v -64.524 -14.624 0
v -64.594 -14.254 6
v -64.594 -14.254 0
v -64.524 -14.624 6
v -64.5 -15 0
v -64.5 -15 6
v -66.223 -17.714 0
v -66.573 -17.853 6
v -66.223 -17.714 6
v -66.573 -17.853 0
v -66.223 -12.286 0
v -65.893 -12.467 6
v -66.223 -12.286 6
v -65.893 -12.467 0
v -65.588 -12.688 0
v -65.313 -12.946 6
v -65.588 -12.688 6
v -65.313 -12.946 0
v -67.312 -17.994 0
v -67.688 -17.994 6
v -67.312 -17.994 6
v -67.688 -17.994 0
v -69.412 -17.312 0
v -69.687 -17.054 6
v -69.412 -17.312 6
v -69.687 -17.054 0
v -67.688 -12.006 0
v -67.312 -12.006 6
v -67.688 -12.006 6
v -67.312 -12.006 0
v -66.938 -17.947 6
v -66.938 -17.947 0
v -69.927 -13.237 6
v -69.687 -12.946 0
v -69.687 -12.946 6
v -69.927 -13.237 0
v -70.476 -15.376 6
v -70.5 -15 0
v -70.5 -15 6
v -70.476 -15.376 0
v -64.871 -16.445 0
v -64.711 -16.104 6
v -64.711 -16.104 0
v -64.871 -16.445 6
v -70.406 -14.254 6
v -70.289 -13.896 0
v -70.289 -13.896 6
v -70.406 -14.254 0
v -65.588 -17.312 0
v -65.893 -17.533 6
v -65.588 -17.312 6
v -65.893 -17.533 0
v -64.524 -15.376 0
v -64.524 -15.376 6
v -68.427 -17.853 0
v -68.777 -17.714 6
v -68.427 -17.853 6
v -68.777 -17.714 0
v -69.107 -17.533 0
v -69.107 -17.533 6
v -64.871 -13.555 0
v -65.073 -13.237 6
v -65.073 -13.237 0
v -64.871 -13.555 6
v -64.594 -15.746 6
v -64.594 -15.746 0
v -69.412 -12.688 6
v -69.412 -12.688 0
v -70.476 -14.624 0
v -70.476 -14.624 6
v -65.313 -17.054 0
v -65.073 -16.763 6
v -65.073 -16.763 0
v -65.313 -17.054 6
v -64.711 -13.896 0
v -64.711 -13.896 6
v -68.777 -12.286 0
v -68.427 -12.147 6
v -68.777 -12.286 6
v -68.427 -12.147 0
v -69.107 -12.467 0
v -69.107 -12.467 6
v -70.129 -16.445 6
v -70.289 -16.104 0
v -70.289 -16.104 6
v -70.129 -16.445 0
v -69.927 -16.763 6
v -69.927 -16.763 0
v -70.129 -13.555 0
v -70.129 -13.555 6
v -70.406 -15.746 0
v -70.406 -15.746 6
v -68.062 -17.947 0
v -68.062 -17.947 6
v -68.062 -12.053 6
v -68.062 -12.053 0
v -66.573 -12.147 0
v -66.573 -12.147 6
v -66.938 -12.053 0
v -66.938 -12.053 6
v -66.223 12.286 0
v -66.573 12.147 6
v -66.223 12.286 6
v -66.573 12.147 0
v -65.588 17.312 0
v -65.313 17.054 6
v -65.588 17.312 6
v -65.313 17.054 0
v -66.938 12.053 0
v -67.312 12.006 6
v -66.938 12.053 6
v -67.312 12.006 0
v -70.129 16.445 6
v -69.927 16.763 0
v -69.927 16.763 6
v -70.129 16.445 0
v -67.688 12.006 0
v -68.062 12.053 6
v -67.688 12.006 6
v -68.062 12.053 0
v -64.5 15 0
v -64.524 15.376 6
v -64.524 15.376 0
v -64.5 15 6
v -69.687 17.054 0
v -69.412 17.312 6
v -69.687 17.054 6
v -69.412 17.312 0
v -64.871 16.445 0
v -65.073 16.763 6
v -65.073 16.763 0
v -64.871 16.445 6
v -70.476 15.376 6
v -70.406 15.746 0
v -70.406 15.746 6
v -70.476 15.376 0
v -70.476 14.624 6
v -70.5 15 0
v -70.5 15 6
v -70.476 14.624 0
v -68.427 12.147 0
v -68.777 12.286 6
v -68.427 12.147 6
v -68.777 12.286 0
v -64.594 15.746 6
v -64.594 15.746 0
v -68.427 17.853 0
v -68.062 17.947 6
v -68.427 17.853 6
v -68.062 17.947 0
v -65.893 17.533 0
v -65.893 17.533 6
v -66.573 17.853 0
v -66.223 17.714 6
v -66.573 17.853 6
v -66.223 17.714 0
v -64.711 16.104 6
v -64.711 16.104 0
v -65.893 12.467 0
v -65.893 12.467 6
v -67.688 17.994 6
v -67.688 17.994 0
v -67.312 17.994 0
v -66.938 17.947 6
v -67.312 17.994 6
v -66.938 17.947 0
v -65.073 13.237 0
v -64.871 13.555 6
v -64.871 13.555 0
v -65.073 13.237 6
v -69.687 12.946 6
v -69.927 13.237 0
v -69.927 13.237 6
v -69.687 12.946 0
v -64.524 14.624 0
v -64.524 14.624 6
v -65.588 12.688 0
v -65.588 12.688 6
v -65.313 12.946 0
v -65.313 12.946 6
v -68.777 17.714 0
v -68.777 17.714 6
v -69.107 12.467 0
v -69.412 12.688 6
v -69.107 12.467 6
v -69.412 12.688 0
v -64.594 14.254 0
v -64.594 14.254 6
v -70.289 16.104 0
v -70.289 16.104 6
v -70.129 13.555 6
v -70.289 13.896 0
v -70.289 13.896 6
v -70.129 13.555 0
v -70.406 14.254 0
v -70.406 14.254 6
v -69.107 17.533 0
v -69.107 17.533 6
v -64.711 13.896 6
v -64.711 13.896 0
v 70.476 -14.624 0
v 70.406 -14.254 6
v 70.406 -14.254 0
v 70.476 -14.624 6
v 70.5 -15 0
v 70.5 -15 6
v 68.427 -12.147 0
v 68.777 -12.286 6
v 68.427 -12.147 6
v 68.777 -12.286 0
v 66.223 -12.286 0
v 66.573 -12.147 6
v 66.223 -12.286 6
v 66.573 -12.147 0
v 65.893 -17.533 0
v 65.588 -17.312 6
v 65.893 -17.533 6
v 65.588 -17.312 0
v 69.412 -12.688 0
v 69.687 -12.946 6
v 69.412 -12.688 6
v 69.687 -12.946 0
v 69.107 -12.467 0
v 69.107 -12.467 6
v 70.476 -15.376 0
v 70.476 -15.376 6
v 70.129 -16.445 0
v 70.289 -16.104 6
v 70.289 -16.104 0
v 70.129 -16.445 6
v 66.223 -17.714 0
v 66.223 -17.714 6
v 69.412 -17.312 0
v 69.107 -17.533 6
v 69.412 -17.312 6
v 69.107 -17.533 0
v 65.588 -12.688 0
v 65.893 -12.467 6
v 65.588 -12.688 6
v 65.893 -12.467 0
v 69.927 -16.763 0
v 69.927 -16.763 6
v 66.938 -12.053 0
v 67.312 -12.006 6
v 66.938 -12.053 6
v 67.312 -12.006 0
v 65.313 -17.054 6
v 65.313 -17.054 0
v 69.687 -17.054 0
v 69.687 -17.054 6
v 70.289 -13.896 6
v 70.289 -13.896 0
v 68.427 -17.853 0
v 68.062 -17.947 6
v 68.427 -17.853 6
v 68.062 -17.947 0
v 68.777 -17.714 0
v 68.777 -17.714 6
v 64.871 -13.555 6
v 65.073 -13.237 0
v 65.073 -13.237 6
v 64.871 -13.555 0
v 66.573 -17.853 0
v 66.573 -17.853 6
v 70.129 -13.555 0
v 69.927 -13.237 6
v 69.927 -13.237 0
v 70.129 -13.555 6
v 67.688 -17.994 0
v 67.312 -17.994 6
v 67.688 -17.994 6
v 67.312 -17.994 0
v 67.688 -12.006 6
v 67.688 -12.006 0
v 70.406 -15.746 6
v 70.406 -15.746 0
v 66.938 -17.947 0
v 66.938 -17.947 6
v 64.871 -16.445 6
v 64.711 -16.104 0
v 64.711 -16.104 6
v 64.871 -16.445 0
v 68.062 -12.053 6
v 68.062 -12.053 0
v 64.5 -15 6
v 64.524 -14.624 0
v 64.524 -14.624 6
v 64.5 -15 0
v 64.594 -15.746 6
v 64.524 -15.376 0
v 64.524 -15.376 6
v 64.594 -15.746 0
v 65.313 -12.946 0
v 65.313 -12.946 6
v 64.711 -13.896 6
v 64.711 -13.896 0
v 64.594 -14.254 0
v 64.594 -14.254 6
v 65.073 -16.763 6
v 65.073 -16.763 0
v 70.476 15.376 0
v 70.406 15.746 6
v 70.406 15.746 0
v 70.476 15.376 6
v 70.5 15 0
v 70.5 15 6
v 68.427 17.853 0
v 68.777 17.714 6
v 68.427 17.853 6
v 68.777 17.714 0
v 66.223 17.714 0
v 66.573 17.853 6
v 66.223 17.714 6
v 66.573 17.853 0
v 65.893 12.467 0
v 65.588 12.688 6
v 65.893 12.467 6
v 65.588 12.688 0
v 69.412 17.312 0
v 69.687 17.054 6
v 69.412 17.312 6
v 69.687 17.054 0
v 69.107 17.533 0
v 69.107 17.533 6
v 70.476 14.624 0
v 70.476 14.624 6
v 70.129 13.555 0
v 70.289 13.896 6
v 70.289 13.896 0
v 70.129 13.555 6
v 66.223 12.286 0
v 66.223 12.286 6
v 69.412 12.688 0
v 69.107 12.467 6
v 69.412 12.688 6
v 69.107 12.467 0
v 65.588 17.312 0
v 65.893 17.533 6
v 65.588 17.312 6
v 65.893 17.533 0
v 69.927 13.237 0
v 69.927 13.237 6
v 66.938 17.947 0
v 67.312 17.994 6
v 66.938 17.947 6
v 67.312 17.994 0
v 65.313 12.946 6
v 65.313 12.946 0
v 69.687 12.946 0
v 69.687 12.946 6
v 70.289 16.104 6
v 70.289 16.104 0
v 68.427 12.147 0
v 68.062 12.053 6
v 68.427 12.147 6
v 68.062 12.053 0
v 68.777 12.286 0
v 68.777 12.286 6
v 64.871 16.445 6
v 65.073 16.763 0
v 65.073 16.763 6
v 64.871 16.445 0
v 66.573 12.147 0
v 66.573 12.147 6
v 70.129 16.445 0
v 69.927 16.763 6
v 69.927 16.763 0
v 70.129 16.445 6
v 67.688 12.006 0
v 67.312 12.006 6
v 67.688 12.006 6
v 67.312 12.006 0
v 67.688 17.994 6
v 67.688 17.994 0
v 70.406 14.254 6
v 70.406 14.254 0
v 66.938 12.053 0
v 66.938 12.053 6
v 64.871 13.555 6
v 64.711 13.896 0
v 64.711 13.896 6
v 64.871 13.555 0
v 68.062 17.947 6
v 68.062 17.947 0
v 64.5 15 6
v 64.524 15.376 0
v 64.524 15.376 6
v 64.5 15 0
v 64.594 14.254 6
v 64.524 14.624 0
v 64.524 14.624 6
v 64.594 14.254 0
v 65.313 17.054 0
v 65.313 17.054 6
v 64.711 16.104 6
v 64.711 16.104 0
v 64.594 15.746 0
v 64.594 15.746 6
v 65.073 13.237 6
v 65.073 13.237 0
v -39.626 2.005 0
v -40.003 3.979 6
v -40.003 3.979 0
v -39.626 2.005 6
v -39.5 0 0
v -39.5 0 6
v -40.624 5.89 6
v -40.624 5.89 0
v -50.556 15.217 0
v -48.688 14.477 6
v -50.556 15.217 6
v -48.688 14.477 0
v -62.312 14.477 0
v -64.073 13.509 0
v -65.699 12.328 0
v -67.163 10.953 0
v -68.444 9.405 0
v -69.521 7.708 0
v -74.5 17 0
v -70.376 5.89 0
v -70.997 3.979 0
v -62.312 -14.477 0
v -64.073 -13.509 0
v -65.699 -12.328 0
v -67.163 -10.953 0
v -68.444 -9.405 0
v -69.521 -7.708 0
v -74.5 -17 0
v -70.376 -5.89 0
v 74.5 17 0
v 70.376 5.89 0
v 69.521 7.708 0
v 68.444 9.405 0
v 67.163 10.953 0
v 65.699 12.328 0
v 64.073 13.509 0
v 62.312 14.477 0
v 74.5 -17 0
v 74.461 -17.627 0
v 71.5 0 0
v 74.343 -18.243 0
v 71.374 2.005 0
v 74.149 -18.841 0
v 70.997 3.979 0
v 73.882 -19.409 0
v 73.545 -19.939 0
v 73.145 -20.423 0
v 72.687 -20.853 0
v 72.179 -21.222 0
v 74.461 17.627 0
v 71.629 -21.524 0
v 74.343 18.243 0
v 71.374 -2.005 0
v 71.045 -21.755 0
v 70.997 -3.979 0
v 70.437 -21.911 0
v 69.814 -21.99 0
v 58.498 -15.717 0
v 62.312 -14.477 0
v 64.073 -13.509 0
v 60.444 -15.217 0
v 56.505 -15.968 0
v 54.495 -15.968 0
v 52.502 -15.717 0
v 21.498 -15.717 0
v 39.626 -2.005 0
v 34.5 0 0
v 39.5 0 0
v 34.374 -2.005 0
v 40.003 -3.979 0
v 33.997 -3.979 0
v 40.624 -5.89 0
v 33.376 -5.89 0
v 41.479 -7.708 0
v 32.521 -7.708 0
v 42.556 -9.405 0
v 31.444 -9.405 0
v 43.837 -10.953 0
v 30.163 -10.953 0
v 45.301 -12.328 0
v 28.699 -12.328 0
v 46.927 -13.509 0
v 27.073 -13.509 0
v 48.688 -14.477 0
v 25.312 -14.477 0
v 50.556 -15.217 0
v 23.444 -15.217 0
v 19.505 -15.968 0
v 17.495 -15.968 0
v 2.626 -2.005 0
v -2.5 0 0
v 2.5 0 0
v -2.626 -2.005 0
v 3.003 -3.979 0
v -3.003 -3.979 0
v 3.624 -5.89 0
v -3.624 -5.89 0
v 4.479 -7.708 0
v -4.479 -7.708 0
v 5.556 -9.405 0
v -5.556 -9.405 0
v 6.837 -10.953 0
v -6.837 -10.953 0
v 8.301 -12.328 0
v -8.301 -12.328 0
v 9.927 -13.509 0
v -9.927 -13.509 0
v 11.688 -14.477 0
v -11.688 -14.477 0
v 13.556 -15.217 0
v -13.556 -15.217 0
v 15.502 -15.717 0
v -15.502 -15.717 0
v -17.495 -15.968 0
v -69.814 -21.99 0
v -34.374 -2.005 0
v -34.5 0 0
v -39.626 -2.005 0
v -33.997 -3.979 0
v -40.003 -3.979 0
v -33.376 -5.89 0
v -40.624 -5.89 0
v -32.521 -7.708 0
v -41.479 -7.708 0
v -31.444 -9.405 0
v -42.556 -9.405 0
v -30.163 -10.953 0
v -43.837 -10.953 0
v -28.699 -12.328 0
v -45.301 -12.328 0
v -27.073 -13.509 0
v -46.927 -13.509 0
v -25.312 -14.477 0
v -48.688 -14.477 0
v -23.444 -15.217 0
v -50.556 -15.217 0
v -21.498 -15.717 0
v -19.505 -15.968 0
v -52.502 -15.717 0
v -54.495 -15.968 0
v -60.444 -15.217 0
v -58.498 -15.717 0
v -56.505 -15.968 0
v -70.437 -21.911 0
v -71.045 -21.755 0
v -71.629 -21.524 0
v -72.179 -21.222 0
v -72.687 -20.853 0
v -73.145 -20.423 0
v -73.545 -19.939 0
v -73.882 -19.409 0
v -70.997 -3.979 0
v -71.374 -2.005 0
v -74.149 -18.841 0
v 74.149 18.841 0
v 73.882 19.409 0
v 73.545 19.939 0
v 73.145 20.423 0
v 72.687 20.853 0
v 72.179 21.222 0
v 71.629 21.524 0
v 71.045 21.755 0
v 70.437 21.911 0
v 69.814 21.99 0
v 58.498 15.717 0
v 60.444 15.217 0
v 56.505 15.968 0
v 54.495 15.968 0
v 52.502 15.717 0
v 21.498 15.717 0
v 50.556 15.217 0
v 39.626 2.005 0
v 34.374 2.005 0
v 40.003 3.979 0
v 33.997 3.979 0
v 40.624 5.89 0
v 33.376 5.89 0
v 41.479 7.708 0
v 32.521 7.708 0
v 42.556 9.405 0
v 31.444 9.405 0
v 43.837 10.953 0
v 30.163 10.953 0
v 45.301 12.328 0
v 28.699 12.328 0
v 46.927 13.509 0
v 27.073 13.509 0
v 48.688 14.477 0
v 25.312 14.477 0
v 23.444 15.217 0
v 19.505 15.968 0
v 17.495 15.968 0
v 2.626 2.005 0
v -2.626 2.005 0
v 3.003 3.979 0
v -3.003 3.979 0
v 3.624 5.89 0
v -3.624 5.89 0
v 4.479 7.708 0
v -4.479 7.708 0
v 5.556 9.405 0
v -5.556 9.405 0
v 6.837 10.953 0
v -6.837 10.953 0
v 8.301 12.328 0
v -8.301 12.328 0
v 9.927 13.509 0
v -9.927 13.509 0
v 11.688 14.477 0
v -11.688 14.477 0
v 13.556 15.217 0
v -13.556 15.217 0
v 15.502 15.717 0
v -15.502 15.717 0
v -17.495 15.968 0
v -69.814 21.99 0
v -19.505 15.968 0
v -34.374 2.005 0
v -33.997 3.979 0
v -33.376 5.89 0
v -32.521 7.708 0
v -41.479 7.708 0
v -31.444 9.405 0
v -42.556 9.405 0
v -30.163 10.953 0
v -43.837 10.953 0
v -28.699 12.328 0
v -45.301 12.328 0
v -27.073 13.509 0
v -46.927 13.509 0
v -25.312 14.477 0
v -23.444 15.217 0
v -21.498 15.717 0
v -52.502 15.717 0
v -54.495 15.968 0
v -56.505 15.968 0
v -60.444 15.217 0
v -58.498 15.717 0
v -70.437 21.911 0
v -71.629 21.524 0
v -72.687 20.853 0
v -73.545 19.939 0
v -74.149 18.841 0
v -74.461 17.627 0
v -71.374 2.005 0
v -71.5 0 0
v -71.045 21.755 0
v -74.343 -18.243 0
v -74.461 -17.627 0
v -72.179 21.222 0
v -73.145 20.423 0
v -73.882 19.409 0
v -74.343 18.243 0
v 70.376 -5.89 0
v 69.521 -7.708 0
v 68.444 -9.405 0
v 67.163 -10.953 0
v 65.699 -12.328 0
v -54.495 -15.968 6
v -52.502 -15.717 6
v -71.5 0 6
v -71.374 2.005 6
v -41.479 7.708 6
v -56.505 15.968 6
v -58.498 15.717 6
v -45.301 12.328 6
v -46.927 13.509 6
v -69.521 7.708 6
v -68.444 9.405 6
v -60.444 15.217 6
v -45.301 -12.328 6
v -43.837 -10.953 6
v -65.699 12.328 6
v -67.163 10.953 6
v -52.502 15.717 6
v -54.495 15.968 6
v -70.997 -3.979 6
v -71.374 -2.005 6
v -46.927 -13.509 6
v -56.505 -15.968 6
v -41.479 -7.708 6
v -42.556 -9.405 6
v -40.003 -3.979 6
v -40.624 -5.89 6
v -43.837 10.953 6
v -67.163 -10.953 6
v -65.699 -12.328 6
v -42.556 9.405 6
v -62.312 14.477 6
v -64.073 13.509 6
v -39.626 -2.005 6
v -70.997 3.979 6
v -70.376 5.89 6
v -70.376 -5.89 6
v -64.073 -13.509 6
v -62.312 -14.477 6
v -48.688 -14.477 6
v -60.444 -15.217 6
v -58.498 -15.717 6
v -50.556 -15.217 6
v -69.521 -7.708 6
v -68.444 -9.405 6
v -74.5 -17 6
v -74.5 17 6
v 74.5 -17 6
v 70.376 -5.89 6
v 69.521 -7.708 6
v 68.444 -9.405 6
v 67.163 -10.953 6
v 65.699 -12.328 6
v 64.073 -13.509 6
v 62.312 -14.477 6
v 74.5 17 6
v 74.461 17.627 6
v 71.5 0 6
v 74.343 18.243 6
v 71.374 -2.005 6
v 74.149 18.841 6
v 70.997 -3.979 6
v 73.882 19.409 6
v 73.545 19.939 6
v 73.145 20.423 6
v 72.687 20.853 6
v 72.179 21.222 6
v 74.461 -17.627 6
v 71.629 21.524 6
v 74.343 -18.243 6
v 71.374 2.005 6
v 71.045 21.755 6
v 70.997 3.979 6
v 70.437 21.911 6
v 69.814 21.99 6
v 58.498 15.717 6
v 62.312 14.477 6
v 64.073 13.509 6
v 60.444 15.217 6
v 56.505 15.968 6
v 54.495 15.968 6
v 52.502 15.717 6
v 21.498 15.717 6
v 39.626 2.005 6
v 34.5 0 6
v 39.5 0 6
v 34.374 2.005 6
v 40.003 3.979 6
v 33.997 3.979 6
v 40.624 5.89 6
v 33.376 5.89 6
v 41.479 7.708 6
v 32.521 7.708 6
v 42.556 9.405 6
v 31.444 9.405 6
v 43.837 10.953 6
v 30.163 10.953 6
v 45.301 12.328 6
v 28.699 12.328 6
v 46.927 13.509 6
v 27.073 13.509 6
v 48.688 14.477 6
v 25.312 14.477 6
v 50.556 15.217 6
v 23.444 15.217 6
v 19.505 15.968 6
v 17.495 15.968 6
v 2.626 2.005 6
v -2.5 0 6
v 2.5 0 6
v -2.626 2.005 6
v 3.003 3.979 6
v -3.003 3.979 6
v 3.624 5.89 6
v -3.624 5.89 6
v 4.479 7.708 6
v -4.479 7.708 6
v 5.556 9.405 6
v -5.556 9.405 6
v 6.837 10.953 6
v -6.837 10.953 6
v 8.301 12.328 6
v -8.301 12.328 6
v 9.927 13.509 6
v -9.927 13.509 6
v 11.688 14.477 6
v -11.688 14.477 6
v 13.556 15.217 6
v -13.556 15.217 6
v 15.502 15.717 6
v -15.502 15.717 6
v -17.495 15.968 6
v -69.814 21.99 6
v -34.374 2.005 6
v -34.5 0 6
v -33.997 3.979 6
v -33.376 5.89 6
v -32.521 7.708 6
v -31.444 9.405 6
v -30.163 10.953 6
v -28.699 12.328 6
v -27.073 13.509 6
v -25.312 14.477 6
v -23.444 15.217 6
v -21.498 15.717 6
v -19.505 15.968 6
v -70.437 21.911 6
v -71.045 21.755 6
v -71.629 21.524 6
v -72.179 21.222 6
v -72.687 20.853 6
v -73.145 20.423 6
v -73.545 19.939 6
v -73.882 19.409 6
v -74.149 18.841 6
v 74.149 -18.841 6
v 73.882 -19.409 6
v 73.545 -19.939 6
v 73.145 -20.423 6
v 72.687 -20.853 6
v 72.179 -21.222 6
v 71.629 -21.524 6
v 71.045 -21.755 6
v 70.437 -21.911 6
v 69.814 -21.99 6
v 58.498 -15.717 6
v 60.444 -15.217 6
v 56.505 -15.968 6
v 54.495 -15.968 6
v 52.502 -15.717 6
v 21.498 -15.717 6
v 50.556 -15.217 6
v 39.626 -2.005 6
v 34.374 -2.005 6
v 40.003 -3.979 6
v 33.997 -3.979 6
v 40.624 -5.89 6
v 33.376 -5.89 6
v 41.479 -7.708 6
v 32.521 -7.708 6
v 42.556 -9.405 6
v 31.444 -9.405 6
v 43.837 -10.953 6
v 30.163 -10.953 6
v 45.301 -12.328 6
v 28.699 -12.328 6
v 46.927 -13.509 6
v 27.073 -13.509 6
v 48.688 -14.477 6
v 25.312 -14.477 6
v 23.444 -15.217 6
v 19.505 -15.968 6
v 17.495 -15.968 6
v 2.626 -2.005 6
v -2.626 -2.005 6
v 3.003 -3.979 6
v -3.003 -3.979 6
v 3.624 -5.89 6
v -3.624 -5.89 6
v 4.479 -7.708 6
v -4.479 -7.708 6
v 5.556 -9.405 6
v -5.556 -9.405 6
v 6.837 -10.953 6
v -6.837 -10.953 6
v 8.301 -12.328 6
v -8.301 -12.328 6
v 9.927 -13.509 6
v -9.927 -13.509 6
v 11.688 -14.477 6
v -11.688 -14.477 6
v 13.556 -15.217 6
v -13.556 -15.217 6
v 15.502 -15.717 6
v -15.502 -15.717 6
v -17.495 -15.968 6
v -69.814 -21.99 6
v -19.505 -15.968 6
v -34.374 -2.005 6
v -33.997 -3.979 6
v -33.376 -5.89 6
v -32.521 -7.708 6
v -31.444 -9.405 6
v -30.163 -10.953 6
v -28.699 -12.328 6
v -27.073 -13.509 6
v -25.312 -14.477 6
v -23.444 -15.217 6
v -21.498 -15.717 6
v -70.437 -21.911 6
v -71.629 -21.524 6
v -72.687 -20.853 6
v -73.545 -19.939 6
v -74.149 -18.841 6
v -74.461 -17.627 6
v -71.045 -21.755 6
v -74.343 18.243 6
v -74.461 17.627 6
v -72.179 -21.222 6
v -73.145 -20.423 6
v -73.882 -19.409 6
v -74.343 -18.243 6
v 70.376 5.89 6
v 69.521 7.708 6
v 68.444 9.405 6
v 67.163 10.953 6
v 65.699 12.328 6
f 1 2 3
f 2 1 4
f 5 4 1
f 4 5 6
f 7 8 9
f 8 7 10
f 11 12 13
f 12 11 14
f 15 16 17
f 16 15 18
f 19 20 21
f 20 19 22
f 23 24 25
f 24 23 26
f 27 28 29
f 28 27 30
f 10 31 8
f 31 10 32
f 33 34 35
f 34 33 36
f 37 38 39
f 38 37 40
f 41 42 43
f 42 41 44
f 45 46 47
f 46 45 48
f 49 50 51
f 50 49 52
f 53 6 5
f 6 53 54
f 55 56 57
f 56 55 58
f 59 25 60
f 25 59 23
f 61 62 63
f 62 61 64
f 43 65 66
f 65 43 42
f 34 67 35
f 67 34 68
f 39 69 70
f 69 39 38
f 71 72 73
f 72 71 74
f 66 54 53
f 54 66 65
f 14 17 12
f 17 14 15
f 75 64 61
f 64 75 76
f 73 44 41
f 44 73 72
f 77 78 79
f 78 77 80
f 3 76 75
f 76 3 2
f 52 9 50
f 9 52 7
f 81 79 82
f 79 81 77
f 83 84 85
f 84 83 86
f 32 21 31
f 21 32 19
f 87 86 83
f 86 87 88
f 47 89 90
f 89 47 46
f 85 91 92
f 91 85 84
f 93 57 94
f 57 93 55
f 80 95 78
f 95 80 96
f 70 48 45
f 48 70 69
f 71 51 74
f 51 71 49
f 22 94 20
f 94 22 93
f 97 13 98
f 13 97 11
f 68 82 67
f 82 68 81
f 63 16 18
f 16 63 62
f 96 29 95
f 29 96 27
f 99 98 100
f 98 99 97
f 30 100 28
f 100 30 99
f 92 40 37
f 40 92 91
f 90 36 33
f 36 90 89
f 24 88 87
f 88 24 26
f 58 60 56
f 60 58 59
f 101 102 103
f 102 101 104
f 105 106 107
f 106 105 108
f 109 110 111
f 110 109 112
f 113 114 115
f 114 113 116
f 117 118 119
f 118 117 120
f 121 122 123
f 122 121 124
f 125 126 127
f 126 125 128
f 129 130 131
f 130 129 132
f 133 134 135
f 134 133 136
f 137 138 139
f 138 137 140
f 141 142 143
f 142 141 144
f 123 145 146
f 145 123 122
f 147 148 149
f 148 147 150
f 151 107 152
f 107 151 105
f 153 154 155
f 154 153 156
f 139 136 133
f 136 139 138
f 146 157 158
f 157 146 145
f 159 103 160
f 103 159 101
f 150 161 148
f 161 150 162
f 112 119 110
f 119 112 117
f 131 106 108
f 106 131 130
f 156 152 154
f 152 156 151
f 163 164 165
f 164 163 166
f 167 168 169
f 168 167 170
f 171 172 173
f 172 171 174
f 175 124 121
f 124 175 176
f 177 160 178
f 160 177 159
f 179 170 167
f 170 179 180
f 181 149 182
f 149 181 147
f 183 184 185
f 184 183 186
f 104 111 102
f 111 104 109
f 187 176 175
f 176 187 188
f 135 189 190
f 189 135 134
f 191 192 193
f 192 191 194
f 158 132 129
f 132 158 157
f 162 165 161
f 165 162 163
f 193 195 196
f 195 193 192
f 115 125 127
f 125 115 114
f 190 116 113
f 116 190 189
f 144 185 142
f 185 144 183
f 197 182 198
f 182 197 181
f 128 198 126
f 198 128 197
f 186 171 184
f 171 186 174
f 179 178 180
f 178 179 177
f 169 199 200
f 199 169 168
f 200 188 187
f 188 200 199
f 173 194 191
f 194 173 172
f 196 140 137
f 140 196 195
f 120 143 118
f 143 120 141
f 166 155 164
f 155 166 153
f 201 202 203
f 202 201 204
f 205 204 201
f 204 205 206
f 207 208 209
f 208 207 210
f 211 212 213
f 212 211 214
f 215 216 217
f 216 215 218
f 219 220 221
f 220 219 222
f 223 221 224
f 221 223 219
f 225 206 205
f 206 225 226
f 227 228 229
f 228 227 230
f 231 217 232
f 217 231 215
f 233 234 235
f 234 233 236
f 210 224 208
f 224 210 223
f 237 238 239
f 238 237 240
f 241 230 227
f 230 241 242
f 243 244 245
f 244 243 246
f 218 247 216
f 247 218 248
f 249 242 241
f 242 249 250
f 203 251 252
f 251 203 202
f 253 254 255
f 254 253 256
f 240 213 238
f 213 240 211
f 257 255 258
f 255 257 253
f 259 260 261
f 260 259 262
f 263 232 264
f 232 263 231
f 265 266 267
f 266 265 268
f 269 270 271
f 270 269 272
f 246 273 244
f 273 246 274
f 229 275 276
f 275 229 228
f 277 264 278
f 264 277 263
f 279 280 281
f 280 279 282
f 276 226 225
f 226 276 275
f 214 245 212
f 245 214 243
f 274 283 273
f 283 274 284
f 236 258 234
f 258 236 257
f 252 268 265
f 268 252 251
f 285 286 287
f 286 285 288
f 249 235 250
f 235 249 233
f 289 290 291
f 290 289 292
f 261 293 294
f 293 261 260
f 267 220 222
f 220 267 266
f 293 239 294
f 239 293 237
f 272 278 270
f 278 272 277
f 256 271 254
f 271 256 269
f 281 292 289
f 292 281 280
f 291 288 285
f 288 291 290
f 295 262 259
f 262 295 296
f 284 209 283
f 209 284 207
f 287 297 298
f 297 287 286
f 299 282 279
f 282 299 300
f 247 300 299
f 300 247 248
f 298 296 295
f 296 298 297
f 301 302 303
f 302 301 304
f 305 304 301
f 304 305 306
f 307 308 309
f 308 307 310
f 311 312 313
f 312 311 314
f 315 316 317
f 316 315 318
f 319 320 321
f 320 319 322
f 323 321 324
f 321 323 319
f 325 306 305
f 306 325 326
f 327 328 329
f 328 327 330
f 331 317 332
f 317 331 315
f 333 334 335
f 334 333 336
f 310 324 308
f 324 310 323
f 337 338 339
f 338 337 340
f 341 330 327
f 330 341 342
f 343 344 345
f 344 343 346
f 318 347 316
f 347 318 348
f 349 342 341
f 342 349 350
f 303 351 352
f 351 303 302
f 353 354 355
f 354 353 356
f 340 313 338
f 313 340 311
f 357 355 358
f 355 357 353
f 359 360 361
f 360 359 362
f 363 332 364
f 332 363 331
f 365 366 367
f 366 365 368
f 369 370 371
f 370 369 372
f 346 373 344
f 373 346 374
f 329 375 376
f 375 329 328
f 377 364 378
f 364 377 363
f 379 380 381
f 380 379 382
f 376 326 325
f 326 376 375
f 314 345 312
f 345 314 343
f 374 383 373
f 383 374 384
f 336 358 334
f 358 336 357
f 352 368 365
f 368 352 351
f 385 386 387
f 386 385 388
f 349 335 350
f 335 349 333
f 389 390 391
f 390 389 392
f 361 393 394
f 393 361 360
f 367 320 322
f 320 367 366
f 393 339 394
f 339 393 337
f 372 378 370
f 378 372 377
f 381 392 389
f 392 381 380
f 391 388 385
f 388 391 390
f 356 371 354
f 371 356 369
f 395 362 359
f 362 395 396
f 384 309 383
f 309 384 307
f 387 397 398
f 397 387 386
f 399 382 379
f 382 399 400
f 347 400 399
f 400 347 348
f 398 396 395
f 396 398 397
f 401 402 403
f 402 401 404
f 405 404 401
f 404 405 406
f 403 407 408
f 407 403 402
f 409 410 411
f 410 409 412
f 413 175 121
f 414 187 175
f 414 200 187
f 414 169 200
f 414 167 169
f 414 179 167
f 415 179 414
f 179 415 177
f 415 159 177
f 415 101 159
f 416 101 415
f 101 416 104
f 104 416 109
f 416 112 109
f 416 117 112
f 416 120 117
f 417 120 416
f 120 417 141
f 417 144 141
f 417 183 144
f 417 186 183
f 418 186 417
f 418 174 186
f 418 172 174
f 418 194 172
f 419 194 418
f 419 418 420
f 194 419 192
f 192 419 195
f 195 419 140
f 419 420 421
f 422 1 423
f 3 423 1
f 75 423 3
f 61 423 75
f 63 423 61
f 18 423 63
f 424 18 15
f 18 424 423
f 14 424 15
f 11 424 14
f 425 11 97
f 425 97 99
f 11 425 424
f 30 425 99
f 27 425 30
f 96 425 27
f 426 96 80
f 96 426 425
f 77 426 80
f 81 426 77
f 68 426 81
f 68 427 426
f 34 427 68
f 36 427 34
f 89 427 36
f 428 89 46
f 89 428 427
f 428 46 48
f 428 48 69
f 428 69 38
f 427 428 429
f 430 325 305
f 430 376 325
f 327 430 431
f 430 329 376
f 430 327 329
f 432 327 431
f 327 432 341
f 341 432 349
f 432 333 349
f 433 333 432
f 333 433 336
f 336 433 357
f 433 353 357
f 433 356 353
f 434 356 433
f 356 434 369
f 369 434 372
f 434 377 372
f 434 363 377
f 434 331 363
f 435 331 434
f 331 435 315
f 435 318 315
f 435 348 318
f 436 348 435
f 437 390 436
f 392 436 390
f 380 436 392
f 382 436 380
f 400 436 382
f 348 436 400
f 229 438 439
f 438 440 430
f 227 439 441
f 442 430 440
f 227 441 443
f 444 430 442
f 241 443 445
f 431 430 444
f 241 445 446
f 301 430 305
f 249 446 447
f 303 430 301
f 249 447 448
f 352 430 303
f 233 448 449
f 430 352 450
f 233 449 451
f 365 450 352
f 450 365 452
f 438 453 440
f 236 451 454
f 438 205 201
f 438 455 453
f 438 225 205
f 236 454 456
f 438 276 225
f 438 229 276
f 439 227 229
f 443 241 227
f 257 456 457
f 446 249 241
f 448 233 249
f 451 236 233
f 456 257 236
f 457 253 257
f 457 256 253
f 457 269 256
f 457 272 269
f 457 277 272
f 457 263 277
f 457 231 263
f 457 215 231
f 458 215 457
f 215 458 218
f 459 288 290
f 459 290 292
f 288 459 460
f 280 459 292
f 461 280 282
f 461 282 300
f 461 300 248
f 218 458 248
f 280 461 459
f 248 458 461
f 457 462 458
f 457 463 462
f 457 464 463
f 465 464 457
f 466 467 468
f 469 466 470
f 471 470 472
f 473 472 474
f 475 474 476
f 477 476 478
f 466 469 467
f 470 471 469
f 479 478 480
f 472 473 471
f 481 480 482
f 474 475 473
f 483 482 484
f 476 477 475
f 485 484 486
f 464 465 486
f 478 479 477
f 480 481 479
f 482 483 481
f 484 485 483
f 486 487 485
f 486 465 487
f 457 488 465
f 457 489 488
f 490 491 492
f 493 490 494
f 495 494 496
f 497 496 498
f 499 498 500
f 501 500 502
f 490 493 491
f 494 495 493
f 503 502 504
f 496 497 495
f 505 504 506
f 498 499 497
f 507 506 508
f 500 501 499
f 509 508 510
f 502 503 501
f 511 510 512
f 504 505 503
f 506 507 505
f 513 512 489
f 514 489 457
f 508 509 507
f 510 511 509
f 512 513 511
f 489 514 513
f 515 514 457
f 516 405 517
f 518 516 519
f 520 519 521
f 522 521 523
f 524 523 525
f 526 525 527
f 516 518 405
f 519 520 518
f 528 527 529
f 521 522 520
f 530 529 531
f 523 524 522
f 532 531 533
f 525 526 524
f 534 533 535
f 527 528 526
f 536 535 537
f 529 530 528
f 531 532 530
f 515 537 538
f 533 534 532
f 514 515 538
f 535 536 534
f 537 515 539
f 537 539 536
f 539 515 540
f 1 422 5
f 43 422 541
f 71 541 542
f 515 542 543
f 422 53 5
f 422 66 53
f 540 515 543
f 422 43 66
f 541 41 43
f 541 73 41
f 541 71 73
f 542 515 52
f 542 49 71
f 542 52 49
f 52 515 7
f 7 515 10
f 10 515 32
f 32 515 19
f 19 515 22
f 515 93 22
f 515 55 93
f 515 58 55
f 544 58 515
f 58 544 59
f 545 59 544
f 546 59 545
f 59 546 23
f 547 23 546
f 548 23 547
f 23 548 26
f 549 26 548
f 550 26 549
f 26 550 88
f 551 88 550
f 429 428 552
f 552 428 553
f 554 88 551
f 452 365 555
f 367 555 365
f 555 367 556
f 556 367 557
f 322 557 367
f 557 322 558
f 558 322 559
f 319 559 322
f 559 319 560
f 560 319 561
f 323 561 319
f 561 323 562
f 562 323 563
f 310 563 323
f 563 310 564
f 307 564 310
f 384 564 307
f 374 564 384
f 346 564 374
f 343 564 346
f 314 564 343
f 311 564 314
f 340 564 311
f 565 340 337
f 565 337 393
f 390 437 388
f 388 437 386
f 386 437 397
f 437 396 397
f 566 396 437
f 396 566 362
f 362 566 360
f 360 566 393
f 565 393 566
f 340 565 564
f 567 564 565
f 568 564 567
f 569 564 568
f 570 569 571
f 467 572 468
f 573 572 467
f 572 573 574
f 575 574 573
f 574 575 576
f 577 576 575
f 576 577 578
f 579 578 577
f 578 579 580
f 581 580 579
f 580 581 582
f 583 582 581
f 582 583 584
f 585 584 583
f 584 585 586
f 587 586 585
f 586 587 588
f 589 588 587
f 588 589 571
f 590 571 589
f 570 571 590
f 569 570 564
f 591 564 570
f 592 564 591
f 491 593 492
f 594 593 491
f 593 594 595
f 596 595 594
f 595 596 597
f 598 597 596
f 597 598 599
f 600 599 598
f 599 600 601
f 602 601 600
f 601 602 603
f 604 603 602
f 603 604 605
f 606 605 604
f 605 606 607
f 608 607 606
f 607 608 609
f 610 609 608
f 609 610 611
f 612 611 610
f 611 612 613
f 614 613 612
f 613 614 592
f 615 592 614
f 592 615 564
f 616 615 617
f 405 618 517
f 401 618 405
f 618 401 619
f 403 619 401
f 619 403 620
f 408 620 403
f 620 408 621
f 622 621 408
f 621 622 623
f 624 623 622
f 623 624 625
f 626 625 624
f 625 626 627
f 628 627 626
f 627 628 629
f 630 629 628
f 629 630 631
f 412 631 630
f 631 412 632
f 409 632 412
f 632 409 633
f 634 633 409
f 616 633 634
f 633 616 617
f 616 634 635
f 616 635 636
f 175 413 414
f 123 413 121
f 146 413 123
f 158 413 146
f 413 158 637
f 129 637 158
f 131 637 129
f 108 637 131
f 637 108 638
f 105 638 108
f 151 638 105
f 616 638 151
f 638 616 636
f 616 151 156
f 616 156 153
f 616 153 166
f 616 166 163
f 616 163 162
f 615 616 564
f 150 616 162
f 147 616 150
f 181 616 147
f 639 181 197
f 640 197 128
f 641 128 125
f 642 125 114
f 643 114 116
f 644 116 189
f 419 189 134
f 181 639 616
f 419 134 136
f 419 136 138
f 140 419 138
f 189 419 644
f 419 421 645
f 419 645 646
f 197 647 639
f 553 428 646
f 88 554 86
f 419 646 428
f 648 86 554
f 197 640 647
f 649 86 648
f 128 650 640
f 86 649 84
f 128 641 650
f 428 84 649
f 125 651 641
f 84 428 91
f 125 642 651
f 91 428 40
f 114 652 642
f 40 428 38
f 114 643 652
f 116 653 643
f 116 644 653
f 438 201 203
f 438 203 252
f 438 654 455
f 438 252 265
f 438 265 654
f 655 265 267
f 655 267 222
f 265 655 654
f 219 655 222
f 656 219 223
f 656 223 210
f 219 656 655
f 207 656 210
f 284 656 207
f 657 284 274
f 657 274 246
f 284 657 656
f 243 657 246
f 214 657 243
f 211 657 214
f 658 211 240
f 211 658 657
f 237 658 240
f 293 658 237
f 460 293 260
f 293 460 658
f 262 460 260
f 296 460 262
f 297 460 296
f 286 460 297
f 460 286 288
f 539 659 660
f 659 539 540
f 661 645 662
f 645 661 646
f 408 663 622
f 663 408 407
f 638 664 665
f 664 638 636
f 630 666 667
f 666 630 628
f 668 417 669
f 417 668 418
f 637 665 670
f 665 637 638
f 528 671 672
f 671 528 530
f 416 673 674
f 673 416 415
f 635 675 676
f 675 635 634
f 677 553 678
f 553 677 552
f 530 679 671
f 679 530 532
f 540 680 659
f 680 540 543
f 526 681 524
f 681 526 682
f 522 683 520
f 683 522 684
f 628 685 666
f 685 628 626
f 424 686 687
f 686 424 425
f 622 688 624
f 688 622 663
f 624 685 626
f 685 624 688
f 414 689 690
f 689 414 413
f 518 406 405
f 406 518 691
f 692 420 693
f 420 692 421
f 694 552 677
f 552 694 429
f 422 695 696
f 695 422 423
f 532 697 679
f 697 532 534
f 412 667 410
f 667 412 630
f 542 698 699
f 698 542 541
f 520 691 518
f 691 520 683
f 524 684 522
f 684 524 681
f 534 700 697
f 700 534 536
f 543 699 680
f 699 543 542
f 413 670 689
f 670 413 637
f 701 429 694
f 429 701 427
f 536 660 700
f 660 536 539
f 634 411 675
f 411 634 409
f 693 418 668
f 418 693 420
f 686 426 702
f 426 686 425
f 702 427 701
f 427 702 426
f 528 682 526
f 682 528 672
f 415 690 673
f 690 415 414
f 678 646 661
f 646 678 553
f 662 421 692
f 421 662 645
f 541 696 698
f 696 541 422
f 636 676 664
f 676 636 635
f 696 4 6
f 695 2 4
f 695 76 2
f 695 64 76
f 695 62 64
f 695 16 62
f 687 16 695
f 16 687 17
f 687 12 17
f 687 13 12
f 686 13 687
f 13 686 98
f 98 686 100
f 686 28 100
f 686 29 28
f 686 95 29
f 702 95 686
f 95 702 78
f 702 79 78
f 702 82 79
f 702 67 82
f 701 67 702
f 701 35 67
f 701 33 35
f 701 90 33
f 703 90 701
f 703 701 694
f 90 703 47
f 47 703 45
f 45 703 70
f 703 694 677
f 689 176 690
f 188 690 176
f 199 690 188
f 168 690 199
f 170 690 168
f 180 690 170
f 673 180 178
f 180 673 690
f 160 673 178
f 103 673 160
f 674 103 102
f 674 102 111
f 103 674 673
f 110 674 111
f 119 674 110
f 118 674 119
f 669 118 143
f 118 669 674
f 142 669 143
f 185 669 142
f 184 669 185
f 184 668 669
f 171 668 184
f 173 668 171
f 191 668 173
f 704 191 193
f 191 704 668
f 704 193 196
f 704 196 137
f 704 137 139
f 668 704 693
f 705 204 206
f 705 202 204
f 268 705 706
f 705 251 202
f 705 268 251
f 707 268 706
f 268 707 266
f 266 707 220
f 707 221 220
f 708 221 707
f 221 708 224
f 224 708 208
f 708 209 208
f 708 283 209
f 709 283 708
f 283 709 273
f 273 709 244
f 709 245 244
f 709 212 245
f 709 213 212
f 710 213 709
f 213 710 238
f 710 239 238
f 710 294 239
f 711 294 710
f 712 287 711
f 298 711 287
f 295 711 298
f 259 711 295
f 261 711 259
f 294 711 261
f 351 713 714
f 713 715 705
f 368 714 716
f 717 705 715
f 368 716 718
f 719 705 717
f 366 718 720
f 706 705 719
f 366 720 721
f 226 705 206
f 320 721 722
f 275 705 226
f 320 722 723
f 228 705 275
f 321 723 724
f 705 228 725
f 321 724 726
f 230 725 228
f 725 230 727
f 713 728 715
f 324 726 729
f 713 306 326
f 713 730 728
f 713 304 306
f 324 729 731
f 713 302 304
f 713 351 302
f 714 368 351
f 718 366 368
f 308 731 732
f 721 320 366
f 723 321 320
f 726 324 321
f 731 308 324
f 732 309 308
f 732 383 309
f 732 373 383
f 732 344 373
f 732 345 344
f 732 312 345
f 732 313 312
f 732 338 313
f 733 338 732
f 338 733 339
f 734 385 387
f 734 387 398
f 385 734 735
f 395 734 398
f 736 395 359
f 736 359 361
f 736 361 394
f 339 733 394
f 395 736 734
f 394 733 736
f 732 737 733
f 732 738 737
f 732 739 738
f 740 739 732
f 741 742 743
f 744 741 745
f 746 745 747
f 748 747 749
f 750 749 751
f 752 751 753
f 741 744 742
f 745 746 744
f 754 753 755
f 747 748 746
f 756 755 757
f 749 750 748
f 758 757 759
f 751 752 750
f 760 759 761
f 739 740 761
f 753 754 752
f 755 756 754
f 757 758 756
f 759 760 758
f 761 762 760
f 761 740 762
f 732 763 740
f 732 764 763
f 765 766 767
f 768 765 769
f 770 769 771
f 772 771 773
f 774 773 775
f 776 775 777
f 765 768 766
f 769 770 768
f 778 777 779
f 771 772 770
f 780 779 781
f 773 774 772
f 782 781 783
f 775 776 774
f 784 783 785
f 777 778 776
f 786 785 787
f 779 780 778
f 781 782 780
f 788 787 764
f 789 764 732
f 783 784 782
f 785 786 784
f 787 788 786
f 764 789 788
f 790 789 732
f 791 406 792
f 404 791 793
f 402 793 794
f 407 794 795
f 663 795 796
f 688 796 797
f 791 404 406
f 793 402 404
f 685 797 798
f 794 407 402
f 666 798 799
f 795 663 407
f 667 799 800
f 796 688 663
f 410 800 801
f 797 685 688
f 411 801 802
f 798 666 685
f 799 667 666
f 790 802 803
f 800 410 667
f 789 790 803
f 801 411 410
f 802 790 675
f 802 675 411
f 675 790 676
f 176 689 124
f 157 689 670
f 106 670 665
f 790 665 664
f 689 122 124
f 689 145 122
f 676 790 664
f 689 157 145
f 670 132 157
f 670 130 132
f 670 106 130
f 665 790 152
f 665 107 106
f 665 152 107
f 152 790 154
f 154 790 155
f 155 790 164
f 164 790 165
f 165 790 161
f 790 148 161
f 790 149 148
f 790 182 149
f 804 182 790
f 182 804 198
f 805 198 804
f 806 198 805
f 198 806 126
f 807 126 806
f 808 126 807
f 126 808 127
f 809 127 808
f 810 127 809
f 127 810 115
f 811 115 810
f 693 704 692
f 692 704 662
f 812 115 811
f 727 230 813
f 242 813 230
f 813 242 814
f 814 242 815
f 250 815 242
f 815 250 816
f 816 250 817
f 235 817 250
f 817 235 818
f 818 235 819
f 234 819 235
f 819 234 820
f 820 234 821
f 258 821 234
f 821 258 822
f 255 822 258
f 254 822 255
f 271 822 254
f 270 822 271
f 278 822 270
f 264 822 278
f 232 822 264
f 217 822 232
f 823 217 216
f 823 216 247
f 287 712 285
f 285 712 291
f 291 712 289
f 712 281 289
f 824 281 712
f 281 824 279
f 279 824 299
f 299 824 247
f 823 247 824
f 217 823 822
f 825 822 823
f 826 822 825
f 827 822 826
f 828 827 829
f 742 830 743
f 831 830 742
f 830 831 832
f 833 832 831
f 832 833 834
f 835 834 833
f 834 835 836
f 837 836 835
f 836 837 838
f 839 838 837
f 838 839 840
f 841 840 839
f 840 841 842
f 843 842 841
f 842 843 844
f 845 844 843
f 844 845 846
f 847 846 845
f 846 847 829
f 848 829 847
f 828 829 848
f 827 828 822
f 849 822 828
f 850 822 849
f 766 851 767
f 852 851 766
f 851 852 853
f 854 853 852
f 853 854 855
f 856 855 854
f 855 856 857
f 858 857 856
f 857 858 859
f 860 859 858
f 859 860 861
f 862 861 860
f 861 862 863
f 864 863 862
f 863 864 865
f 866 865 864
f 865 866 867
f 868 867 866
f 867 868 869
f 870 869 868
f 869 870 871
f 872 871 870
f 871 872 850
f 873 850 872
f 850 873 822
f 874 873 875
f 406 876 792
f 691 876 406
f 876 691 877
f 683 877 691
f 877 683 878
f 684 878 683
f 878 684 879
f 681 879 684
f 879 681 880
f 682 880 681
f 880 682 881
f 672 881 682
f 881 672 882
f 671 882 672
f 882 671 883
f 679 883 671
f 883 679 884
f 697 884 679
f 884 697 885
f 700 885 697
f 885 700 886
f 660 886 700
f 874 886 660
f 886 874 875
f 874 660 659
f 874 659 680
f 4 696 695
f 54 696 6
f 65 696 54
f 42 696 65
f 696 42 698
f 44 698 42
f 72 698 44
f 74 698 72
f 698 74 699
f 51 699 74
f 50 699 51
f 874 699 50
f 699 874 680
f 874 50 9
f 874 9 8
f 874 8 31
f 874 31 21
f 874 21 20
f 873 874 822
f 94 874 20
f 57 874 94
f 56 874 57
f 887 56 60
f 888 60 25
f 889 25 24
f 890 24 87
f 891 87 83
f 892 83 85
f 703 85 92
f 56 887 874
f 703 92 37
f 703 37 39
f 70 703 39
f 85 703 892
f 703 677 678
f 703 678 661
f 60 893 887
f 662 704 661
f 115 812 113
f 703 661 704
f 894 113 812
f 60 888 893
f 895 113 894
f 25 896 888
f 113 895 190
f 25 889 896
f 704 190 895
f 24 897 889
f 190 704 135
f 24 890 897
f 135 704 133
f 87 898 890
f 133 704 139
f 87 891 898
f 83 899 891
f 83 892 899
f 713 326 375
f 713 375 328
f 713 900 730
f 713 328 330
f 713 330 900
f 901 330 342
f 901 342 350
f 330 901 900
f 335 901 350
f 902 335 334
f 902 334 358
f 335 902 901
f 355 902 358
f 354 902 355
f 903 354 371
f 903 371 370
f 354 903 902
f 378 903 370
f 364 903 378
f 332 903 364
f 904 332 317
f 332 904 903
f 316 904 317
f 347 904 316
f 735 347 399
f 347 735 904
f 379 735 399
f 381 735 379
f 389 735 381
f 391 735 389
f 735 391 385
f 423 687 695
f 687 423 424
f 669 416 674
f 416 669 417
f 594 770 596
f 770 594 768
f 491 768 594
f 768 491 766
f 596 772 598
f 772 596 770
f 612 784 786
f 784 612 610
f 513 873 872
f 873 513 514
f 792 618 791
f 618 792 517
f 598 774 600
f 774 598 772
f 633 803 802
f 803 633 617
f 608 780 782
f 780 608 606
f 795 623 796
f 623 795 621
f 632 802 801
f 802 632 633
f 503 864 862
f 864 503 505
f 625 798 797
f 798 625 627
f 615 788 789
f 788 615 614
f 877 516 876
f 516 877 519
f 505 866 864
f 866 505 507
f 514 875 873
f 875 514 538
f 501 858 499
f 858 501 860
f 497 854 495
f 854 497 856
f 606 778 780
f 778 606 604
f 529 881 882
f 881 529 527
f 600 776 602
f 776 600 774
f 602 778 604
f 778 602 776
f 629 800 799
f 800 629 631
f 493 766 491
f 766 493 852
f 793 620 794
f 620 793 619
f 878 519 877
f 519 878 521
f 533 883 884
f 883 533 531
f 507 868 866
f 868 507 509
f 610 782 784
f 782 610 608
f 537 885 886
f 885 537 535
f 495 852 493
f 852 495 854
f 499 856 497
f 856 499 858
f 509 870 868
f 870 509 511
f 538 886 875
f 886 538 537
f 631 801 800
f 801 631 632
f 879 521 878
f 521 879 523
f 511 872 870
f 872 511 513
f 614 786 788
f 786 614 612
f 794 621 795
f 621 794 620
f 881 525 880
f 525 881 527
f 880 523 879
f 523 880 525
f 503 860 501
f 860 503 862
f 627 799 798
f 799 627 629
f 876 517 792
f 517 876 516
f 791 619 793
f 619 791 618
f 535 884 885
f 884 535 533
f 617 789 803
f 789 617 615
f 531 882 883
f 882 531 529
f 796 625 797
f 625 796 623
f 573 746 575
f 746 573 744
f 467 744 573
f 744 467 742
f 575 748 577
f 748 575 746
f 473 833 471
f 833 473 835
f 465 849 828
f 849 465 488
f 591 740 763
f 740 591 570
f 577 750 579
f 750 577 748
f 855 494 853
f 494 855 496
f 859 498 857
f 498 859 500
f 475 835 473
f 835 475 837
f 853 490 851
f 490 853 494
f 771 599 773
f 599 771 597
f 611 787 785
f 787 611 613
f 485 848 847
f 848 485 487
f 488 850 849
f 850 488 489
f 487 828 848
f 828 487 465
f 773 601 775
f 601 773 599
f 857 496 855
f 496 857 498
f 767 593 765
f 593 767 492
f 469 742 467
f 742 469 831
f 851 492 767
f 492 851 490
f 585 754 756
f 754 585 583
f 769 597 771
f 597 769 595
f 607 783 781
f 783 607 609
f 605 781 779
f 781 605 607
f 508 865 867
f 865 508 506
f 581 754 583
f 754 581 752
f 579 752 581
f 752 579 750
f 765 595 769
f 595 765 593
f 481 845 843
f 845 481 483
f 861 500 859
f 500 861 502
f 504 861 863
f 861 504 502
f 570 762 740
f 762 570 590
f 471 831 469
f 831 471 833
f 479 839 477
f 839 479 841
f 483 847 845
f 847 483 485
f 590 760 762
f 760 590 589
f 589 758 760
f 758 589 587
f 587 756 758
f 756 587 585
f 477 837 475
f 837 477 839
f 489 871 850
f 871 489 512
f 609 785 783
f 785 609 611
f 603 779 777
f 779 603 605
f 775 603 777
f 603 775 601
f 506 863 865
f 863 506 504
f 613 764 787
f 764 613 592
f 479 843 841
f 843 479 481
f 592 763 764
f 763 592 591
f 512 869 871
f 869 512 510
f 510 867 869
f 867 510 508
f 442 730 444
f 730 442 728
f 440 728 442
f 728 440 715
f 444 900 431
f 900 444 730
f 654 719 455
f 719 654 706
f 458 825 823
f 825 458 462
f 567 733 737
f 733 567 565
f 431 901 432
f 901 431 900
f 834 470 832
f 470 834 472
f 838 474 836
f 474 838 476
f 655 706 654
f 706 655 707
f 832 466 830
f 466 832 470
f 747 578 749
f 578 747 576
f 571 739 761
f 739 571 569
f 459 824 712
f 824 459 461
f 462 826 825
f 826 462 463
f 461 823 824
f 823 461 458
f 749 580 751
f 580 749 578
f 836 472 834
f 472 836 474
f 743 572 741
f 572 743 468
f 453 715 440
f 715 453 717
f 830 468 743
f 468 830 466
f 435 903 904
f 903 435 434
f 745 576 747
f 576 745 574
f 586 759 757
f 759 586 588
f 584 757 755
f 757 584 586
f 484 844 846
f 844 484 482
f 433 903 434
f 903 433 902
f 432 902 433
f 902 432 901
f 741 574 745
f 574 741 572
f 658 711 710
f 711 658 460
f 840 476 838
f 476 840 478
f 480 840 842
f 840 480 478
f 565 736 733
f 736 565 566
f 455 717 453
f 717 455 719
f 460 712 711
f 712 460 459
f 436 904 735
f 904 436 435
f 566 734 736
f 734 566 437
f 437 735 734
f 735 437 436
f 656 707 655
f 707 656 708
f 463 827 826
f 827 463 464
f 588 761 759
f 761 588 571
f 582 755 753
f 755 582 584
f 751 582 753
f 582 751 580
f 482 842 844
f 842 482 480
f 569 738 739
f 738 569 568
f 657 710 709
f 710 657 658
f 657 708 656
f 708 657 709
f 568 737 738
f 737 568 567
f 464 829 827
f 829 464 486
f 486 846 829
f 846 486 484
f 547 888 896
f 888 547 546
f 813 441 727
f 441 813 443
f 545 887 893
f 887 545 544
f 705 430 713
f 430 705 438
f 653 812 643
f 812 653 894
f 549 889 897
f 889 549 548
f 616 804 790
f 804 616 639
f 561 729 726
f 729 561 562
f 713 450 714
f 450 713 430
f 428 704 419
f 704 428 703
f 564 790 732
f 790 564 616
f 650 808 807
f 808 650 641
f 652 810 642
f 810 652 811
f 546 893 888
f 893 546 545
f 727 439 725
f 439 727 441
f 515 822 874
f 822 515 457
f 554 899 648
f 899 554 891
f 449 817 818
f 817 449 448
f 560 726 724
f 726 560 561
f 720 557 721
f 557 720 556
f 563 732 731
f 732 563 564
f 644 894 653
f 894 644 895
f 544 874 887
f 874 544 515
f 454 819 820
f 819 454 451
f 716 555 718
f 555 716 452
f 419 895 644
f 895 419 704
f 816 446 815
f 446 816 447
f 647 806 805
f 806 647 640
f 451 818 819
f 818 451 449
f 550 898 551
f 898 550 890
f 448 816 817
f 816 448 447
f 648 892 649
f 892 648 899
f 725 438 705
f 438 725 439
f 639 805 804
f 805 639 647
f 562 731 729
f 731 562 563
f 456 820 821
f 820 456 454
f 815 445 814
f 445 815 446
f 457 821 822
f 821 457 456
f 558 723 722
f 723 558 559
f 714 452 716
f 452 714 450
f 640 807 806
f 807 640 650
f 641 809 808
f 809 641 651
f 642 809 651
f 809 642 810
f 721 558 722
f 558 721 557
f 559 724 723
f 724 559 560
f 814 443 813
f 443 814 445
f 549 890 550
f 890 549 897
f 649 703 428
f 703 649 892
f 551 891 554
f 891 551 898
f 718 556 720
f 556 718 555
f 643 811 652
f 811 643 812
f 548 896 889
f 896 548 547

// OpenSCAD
$fn = 50;


difference() {
	union() {
		hull() {
			translate(v = [-69.5000000000, 17.0000000000, 0]) {
				cylinder(h = 6, r = 5);
			}
			translate(v = [69.5000000000, 17.0000000000, 0]) {
				cylinder(h = 6, r = 5);
			}
			translate(v = [-69.5000000000, -17.0000000000, 0]) {
				cylinder(h = 6, r = 5);
			}
			translate(v = [69.5000000000, -17.0000000000, 0]) {
				cylinder(h = 6, r = 5);
			}
		}
	}
	union() {
		#translate(v = [-67.5000000000, -15.0000000000, -100.0000000000]) {
			cylinder(h = 200, r = 3.0000000000);
		}
		#translate(v = [-67.5000000000, 15.0000000000, -100.0000000000]) {
			cylinder(h = 200, r = 3.0000000000);
		}
		#translate(v = [67.5000000000, -15.0000000000, -100.0000000000]) {
			cylinder(h = 200, r = 3.0000000000);
		}
		#translate(v = [67.5000000000, 15.0000000000, -100.0000000000]) {
			cylinder(h = 200, r = 3.0000000000);
		}
		#translate(v = [-55.5000000000, 0, 0]) {
			cylinder(h = 6, r = 16.0000000000);
		}
		#translate(v = [-18.5000000000, 0, 0]) {
			cylinder(h = 6, r = 16.0000000000);
		}
		#translate(v = [18.5000000000, 0, 0]) {
			cylinder(h = 6, r = 16.0000000000);
		}
		#translate(v = [55.5000000000, 0, 0]) {
			cylinder(h = 6, r = 16.0000000000);
		}
	}
}
